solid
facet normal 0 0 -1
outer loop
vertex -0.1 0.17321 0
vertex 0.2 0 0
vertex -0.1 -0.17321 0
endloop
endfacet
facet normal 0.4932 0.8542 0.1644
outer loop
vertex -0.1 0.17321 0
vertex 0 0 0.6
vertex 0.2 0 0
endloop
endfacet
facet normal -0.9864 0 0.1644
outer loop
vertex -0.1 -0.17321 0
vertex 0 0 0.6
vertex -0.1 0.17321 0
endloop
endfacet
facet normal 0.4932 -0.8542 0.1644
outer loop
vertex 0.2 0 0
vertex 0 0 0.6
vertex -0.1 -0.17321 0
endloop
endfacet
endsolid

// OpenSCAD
scale([0.2, 0.2, 0.2])
scale([1, 1, 3])
linear_extrude(1, scale=-1)
circle($fn=3);
